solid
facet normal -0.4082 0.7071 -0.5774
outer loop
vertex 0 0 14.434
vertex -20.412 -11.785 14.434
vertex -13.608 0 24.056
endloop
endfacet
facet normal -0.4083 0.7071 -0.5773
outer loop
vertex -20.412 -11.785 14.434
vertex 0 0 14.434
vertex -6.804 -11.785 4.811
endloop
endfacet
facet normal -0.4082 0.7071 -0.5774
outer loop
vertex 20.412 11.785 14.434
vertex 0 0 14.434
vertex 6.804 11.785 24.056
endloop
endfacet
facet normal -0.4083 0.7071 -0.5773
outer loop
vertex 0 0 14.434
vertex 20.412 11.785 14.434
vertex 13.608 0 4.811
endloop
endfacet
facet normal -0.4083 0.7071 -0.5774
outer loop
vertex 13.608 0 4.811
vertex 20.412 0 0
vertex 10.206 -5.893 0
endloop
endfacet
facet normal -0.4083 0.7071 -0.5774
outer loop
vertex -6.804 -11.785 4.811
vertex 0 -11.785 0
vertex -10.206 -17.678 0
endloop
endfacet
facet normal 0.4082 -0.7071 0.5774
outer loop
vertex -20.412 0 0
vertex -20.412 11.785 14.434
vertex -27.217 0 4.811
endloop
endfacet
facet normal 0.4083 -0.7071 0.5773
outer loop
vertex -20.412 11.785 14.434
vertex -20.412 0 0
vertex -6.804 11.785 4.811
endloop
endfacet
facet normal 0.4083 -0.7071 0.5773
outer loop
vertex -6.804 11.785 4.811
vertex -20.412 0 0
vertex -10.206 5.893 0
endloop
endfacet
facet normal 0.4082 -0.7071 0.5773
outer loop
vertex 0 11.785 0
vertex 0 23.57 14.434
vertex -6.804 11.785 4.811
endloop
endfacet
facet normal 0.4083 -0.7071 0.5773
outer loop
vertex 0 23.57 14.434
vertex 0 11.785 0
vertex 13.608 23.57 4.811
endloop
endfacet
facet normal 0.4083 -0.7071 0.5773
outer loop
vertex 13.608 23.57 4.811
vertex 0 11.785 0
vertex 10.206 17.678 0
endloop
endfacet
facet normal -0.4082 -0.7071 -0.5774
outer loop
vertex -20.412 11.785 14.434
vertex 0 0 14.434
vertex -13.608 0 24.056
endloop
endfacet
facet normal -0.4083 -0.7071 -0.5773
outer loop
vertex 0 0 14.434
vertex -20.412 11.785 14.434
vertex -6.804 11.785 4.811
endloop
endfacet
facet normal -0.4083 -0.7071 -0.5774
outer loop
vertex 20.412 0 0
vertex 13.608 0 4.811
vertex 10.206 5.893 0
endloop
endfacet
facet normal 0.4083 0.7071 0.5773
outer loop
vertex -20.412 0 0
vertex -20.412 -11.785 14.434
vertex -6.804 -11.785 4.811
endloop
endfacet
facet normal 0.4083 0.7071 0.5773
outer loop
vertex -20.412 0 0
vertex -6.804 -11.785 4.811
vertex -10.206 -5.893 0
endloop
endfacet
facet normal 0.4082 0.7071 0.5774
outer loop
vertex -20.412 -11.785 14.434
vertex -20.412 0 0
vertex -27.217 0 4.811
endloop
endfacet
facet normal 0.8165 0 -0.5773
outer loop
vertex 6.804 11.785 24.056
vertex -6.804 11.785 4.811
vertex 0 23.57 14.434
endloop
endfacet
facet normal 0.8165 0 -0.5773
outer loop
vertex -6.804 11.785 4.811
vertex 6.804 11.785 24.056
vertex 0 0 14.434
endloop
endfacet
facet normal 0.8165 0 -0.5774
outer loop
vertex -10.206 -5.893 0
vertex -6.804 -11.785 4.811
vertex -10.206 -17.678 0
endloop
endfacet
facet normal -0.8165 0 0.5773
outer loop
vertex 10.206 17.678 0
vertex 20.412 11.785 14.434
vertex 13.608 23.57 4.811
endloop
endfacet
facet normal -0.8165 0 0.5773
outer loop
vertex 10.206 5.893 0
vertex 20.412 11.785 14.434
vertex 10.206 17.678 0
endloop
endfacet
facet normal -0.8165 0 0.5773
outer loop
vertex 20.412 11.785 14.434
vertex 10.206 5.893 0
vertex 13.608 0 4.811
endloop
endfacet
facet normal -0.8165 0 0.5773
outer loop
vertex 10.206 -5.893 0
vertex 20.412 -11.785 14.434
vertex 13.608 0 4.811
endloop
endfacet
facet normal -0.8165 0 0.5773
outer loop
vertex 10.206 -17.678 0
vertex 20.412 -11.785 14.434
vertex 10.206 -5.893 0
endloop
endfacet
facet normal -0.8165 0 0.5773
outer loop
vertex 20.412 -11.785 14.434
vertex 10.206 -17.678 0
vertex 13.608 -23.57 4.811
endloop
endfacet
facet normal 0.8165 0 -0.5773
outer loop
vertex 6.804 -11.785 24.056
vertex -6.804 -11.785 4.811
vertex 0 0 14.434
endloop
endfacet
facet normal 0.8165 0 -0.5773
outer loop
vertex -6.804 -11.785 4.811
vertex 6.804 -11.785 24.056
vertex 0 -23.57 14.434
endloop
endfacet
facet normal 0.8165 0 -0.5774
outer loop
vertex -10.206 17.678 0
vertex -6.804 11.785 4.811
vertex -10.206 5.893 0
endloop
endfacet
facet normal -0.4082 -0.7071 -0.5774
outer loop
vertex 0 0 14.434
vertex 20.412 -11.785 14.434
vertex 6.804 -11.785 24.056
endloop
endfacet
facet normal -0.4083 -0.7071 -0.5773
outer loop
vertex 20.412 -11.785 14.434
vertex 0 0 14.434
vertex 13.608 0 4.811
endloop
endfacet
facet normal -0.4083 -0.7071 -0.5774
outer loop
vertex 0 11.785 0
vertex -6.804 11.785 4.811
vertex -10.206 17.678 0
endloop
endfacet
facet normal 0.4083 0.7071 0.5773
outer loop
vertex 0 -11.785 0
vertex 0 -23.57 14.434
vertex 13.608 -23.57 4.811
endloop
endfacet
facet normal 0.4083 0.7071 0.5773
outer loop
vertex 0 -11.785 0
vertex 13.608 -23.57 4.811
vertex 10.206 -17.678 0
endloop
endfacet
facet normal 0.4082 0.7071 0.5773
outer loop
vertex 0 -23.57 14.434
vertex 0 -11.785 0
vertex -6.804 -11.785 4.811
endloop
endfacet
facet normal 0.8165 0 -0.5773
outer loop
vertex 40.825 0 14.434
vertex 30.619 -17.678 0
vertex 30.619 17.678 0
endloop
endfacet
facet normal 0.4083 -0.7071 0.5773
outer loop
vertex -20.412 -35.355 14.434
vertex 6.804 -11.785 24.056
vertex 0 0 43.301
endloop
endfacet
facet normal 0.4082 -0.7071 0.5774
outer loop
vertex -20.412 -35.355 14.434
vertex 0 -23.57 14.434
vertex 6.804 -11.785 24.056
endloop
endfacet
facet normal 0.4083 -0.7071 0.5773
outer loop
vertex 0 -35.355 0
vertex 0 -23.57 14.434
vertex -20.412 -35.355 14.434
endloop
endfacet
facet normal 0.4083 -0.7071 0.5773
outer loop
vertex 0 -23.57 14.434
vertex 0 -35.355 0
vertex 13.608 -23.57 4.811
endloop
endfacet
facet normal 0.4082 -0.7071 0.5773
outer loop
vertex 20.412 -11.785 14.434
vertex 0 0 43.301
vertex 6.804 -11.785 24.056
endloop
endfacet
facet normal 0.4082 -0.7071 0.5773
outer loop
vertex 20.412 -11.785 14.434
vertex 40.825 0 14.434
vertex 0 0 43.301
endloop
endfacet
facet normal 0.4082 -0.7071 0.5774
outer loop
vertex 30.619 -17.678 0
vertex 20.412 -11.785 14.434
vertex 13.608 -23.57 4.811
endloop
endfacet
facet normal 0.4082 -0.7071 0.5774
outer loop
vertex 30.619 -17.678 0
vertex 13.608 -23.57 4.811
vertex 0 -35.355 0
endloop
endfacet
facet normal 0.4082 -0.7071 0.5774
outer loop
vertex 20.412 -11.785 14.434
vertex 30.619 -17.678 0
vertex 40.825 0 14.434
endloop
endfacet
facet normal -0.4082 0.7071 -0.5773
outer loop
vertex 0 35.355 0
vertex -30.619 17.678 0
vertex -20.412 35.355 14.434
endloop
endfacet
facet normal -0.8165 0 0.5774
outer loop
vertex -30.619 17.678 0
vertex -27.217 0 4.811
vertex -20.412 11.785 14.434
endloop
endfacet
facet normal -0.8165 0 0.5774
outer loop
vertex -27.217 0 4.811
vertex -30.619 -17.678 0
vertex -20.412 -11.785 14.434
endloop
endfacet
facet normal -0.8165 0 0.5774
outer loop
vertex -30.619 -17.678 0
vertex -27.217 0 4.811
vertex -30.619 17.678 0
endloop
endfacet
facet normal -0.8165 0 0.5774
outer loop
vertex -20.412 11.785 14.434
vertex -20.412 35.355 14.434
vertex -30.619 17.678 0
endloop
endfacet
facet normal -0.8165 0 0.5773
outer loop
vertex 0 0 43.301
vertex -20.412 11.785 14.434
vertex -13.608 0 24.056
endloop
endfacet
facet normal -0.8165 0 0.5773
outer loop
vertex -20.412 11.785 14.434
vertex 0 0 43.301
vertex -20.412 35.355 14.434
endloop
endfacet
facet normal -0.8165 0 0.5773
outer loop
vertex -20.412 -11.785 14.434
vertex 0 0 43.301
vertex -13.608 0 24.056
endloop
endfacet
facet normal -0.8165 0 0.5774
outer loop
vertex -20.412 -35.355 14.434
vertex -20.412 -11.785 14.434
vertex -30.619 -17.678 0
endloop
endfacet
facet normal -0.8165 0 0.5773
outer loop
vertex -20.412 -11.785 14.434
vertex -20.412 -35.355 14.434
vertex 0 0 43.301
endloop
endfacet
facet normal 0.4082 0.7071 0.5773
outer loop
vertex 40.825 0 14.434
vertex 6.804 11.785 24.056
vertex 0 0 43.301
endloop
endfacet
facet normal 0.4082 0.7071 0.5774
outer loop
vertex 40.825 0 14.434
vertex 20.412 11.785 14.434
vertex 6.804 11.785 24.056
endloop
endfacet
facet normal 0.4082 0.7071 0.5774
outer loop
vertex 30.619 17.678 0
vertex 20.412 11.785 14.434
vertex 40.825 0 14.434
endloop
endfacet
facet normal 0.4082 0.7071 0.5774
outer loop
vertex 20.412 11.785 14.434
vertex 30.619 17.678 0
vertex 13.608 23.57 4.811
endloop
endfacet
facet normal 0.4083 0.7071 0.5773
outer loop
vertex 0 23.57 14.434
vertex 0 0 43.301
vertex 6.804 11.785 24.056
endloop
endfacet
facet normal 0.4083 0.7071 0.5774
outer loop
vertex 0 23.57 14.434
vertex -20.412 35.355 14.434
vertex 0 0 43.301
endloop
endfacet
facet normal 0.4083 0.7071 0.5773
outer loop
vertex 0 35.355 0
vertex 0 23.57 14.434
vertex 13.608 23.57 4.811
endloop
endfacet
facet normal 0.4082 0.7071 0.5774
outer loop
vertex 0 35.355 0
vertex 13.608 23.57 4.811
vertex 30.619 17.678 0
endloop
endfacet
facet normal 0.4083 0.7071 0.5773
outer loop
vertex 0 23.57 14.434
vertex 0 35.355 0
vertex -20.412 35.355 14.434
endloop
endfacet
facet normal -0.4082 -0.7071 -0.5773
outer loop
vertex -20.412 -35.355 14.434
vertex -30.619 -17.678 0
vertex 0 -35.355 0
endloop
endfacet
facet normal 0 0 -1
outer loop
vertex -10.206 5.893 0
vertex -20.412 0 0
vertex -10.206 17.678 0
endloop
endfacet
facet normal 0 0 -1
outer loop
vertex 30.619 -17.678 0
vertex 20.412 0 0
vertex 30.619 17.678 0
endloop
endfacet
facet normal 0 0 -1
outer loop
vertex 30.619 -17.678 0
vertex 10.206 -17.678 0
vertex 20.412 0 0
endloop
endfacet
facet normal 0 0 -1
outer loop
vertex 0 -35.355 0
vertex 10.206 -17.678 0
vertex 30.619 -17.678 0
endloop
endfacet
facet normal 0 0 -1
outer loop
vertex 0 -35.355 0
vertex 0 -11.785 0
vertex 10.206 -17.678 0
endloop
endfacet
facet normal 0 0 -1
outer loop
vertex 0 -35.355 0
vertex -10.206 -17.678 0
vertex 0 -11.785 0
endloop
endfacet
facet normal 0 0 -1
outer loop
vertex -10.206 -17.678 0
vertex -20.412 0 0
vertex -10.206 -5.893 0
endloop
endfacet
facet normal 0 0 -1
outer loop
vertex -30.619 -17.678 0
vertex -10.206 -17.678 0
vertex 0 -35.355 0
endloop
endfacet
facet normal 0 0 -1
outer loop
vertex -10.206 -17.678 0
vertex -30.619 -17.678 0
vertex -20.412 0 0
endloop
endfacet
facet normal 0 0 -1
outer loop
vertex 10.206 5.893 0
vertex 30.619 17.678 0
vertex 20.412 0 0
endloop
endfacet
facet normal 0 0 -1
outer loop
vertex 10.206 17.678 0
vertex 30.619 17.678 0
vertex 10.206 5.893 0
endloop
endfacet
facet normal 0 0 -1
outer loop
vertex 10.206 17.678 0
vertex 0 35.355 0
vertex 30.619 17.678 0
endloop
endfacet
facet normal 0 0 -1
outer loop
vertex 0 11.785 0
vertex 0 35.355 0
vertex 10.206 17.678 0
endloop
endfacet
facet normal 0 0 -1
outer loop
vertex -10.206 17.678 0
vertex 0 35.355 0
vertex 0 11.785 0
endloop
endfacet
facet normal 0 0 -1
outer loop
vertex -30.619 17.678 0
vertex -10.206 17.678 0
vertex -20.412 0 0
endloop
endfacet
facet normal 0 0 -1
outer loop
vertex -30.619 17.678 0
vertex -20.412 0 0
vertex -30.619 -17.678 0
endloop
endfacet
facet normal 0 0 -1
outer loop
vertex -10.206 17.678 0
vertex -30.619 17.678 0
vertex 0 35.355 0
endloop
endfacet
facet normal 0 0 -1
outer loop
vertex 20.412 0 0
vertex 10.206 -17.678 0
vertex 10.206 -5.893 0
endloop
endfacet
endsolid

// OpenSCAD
// Menger Sponge

// Size of edge of sponge
D=50;
// Fractal depth (number of iterations)
n=1;

echo(version=version());

module menger() {
  difference() {
    cube(D, center=true);
    for (v=[[0,0,0], [0,0,90], [0,90,0]])
      rotate(v) menger_negative(side=D, maxside=D, level=n);
  }
}

module menger_negative(side=1, maxside=1, level=1) {
  l=side/3;
  cube([maxside*1.1, l, l], center=true);
  if (level > 1) {
    for (i=[-1:1], j=[-1:1])
      if (i || j)
        translate([0, i*l, j*l])
          menger_negative(side=l*1.05, maxside=maxside, level=level-1);
  }
}

difference() {
  rotate([45, atan(1/sqrt(2)), 0]) menger();
  translate([0,0,-D]) cube(2*D, center=true);
}

// Written by Nathan Hellweg, Emmett Lalish and Marius Kintel May 13, 2013
//
// To the extent possible under law, the author(s) have dedicated all
// copyright and related and neighboring rights to this software to the
// public domain worldwide. This software is distributed without any
// warranty.
//
// You should have received a copy of the CC0 Public Domain
// Dedication along with this software.
// If not, see <http://creativecommons.org/publicdomain/zero/1.0/>.
